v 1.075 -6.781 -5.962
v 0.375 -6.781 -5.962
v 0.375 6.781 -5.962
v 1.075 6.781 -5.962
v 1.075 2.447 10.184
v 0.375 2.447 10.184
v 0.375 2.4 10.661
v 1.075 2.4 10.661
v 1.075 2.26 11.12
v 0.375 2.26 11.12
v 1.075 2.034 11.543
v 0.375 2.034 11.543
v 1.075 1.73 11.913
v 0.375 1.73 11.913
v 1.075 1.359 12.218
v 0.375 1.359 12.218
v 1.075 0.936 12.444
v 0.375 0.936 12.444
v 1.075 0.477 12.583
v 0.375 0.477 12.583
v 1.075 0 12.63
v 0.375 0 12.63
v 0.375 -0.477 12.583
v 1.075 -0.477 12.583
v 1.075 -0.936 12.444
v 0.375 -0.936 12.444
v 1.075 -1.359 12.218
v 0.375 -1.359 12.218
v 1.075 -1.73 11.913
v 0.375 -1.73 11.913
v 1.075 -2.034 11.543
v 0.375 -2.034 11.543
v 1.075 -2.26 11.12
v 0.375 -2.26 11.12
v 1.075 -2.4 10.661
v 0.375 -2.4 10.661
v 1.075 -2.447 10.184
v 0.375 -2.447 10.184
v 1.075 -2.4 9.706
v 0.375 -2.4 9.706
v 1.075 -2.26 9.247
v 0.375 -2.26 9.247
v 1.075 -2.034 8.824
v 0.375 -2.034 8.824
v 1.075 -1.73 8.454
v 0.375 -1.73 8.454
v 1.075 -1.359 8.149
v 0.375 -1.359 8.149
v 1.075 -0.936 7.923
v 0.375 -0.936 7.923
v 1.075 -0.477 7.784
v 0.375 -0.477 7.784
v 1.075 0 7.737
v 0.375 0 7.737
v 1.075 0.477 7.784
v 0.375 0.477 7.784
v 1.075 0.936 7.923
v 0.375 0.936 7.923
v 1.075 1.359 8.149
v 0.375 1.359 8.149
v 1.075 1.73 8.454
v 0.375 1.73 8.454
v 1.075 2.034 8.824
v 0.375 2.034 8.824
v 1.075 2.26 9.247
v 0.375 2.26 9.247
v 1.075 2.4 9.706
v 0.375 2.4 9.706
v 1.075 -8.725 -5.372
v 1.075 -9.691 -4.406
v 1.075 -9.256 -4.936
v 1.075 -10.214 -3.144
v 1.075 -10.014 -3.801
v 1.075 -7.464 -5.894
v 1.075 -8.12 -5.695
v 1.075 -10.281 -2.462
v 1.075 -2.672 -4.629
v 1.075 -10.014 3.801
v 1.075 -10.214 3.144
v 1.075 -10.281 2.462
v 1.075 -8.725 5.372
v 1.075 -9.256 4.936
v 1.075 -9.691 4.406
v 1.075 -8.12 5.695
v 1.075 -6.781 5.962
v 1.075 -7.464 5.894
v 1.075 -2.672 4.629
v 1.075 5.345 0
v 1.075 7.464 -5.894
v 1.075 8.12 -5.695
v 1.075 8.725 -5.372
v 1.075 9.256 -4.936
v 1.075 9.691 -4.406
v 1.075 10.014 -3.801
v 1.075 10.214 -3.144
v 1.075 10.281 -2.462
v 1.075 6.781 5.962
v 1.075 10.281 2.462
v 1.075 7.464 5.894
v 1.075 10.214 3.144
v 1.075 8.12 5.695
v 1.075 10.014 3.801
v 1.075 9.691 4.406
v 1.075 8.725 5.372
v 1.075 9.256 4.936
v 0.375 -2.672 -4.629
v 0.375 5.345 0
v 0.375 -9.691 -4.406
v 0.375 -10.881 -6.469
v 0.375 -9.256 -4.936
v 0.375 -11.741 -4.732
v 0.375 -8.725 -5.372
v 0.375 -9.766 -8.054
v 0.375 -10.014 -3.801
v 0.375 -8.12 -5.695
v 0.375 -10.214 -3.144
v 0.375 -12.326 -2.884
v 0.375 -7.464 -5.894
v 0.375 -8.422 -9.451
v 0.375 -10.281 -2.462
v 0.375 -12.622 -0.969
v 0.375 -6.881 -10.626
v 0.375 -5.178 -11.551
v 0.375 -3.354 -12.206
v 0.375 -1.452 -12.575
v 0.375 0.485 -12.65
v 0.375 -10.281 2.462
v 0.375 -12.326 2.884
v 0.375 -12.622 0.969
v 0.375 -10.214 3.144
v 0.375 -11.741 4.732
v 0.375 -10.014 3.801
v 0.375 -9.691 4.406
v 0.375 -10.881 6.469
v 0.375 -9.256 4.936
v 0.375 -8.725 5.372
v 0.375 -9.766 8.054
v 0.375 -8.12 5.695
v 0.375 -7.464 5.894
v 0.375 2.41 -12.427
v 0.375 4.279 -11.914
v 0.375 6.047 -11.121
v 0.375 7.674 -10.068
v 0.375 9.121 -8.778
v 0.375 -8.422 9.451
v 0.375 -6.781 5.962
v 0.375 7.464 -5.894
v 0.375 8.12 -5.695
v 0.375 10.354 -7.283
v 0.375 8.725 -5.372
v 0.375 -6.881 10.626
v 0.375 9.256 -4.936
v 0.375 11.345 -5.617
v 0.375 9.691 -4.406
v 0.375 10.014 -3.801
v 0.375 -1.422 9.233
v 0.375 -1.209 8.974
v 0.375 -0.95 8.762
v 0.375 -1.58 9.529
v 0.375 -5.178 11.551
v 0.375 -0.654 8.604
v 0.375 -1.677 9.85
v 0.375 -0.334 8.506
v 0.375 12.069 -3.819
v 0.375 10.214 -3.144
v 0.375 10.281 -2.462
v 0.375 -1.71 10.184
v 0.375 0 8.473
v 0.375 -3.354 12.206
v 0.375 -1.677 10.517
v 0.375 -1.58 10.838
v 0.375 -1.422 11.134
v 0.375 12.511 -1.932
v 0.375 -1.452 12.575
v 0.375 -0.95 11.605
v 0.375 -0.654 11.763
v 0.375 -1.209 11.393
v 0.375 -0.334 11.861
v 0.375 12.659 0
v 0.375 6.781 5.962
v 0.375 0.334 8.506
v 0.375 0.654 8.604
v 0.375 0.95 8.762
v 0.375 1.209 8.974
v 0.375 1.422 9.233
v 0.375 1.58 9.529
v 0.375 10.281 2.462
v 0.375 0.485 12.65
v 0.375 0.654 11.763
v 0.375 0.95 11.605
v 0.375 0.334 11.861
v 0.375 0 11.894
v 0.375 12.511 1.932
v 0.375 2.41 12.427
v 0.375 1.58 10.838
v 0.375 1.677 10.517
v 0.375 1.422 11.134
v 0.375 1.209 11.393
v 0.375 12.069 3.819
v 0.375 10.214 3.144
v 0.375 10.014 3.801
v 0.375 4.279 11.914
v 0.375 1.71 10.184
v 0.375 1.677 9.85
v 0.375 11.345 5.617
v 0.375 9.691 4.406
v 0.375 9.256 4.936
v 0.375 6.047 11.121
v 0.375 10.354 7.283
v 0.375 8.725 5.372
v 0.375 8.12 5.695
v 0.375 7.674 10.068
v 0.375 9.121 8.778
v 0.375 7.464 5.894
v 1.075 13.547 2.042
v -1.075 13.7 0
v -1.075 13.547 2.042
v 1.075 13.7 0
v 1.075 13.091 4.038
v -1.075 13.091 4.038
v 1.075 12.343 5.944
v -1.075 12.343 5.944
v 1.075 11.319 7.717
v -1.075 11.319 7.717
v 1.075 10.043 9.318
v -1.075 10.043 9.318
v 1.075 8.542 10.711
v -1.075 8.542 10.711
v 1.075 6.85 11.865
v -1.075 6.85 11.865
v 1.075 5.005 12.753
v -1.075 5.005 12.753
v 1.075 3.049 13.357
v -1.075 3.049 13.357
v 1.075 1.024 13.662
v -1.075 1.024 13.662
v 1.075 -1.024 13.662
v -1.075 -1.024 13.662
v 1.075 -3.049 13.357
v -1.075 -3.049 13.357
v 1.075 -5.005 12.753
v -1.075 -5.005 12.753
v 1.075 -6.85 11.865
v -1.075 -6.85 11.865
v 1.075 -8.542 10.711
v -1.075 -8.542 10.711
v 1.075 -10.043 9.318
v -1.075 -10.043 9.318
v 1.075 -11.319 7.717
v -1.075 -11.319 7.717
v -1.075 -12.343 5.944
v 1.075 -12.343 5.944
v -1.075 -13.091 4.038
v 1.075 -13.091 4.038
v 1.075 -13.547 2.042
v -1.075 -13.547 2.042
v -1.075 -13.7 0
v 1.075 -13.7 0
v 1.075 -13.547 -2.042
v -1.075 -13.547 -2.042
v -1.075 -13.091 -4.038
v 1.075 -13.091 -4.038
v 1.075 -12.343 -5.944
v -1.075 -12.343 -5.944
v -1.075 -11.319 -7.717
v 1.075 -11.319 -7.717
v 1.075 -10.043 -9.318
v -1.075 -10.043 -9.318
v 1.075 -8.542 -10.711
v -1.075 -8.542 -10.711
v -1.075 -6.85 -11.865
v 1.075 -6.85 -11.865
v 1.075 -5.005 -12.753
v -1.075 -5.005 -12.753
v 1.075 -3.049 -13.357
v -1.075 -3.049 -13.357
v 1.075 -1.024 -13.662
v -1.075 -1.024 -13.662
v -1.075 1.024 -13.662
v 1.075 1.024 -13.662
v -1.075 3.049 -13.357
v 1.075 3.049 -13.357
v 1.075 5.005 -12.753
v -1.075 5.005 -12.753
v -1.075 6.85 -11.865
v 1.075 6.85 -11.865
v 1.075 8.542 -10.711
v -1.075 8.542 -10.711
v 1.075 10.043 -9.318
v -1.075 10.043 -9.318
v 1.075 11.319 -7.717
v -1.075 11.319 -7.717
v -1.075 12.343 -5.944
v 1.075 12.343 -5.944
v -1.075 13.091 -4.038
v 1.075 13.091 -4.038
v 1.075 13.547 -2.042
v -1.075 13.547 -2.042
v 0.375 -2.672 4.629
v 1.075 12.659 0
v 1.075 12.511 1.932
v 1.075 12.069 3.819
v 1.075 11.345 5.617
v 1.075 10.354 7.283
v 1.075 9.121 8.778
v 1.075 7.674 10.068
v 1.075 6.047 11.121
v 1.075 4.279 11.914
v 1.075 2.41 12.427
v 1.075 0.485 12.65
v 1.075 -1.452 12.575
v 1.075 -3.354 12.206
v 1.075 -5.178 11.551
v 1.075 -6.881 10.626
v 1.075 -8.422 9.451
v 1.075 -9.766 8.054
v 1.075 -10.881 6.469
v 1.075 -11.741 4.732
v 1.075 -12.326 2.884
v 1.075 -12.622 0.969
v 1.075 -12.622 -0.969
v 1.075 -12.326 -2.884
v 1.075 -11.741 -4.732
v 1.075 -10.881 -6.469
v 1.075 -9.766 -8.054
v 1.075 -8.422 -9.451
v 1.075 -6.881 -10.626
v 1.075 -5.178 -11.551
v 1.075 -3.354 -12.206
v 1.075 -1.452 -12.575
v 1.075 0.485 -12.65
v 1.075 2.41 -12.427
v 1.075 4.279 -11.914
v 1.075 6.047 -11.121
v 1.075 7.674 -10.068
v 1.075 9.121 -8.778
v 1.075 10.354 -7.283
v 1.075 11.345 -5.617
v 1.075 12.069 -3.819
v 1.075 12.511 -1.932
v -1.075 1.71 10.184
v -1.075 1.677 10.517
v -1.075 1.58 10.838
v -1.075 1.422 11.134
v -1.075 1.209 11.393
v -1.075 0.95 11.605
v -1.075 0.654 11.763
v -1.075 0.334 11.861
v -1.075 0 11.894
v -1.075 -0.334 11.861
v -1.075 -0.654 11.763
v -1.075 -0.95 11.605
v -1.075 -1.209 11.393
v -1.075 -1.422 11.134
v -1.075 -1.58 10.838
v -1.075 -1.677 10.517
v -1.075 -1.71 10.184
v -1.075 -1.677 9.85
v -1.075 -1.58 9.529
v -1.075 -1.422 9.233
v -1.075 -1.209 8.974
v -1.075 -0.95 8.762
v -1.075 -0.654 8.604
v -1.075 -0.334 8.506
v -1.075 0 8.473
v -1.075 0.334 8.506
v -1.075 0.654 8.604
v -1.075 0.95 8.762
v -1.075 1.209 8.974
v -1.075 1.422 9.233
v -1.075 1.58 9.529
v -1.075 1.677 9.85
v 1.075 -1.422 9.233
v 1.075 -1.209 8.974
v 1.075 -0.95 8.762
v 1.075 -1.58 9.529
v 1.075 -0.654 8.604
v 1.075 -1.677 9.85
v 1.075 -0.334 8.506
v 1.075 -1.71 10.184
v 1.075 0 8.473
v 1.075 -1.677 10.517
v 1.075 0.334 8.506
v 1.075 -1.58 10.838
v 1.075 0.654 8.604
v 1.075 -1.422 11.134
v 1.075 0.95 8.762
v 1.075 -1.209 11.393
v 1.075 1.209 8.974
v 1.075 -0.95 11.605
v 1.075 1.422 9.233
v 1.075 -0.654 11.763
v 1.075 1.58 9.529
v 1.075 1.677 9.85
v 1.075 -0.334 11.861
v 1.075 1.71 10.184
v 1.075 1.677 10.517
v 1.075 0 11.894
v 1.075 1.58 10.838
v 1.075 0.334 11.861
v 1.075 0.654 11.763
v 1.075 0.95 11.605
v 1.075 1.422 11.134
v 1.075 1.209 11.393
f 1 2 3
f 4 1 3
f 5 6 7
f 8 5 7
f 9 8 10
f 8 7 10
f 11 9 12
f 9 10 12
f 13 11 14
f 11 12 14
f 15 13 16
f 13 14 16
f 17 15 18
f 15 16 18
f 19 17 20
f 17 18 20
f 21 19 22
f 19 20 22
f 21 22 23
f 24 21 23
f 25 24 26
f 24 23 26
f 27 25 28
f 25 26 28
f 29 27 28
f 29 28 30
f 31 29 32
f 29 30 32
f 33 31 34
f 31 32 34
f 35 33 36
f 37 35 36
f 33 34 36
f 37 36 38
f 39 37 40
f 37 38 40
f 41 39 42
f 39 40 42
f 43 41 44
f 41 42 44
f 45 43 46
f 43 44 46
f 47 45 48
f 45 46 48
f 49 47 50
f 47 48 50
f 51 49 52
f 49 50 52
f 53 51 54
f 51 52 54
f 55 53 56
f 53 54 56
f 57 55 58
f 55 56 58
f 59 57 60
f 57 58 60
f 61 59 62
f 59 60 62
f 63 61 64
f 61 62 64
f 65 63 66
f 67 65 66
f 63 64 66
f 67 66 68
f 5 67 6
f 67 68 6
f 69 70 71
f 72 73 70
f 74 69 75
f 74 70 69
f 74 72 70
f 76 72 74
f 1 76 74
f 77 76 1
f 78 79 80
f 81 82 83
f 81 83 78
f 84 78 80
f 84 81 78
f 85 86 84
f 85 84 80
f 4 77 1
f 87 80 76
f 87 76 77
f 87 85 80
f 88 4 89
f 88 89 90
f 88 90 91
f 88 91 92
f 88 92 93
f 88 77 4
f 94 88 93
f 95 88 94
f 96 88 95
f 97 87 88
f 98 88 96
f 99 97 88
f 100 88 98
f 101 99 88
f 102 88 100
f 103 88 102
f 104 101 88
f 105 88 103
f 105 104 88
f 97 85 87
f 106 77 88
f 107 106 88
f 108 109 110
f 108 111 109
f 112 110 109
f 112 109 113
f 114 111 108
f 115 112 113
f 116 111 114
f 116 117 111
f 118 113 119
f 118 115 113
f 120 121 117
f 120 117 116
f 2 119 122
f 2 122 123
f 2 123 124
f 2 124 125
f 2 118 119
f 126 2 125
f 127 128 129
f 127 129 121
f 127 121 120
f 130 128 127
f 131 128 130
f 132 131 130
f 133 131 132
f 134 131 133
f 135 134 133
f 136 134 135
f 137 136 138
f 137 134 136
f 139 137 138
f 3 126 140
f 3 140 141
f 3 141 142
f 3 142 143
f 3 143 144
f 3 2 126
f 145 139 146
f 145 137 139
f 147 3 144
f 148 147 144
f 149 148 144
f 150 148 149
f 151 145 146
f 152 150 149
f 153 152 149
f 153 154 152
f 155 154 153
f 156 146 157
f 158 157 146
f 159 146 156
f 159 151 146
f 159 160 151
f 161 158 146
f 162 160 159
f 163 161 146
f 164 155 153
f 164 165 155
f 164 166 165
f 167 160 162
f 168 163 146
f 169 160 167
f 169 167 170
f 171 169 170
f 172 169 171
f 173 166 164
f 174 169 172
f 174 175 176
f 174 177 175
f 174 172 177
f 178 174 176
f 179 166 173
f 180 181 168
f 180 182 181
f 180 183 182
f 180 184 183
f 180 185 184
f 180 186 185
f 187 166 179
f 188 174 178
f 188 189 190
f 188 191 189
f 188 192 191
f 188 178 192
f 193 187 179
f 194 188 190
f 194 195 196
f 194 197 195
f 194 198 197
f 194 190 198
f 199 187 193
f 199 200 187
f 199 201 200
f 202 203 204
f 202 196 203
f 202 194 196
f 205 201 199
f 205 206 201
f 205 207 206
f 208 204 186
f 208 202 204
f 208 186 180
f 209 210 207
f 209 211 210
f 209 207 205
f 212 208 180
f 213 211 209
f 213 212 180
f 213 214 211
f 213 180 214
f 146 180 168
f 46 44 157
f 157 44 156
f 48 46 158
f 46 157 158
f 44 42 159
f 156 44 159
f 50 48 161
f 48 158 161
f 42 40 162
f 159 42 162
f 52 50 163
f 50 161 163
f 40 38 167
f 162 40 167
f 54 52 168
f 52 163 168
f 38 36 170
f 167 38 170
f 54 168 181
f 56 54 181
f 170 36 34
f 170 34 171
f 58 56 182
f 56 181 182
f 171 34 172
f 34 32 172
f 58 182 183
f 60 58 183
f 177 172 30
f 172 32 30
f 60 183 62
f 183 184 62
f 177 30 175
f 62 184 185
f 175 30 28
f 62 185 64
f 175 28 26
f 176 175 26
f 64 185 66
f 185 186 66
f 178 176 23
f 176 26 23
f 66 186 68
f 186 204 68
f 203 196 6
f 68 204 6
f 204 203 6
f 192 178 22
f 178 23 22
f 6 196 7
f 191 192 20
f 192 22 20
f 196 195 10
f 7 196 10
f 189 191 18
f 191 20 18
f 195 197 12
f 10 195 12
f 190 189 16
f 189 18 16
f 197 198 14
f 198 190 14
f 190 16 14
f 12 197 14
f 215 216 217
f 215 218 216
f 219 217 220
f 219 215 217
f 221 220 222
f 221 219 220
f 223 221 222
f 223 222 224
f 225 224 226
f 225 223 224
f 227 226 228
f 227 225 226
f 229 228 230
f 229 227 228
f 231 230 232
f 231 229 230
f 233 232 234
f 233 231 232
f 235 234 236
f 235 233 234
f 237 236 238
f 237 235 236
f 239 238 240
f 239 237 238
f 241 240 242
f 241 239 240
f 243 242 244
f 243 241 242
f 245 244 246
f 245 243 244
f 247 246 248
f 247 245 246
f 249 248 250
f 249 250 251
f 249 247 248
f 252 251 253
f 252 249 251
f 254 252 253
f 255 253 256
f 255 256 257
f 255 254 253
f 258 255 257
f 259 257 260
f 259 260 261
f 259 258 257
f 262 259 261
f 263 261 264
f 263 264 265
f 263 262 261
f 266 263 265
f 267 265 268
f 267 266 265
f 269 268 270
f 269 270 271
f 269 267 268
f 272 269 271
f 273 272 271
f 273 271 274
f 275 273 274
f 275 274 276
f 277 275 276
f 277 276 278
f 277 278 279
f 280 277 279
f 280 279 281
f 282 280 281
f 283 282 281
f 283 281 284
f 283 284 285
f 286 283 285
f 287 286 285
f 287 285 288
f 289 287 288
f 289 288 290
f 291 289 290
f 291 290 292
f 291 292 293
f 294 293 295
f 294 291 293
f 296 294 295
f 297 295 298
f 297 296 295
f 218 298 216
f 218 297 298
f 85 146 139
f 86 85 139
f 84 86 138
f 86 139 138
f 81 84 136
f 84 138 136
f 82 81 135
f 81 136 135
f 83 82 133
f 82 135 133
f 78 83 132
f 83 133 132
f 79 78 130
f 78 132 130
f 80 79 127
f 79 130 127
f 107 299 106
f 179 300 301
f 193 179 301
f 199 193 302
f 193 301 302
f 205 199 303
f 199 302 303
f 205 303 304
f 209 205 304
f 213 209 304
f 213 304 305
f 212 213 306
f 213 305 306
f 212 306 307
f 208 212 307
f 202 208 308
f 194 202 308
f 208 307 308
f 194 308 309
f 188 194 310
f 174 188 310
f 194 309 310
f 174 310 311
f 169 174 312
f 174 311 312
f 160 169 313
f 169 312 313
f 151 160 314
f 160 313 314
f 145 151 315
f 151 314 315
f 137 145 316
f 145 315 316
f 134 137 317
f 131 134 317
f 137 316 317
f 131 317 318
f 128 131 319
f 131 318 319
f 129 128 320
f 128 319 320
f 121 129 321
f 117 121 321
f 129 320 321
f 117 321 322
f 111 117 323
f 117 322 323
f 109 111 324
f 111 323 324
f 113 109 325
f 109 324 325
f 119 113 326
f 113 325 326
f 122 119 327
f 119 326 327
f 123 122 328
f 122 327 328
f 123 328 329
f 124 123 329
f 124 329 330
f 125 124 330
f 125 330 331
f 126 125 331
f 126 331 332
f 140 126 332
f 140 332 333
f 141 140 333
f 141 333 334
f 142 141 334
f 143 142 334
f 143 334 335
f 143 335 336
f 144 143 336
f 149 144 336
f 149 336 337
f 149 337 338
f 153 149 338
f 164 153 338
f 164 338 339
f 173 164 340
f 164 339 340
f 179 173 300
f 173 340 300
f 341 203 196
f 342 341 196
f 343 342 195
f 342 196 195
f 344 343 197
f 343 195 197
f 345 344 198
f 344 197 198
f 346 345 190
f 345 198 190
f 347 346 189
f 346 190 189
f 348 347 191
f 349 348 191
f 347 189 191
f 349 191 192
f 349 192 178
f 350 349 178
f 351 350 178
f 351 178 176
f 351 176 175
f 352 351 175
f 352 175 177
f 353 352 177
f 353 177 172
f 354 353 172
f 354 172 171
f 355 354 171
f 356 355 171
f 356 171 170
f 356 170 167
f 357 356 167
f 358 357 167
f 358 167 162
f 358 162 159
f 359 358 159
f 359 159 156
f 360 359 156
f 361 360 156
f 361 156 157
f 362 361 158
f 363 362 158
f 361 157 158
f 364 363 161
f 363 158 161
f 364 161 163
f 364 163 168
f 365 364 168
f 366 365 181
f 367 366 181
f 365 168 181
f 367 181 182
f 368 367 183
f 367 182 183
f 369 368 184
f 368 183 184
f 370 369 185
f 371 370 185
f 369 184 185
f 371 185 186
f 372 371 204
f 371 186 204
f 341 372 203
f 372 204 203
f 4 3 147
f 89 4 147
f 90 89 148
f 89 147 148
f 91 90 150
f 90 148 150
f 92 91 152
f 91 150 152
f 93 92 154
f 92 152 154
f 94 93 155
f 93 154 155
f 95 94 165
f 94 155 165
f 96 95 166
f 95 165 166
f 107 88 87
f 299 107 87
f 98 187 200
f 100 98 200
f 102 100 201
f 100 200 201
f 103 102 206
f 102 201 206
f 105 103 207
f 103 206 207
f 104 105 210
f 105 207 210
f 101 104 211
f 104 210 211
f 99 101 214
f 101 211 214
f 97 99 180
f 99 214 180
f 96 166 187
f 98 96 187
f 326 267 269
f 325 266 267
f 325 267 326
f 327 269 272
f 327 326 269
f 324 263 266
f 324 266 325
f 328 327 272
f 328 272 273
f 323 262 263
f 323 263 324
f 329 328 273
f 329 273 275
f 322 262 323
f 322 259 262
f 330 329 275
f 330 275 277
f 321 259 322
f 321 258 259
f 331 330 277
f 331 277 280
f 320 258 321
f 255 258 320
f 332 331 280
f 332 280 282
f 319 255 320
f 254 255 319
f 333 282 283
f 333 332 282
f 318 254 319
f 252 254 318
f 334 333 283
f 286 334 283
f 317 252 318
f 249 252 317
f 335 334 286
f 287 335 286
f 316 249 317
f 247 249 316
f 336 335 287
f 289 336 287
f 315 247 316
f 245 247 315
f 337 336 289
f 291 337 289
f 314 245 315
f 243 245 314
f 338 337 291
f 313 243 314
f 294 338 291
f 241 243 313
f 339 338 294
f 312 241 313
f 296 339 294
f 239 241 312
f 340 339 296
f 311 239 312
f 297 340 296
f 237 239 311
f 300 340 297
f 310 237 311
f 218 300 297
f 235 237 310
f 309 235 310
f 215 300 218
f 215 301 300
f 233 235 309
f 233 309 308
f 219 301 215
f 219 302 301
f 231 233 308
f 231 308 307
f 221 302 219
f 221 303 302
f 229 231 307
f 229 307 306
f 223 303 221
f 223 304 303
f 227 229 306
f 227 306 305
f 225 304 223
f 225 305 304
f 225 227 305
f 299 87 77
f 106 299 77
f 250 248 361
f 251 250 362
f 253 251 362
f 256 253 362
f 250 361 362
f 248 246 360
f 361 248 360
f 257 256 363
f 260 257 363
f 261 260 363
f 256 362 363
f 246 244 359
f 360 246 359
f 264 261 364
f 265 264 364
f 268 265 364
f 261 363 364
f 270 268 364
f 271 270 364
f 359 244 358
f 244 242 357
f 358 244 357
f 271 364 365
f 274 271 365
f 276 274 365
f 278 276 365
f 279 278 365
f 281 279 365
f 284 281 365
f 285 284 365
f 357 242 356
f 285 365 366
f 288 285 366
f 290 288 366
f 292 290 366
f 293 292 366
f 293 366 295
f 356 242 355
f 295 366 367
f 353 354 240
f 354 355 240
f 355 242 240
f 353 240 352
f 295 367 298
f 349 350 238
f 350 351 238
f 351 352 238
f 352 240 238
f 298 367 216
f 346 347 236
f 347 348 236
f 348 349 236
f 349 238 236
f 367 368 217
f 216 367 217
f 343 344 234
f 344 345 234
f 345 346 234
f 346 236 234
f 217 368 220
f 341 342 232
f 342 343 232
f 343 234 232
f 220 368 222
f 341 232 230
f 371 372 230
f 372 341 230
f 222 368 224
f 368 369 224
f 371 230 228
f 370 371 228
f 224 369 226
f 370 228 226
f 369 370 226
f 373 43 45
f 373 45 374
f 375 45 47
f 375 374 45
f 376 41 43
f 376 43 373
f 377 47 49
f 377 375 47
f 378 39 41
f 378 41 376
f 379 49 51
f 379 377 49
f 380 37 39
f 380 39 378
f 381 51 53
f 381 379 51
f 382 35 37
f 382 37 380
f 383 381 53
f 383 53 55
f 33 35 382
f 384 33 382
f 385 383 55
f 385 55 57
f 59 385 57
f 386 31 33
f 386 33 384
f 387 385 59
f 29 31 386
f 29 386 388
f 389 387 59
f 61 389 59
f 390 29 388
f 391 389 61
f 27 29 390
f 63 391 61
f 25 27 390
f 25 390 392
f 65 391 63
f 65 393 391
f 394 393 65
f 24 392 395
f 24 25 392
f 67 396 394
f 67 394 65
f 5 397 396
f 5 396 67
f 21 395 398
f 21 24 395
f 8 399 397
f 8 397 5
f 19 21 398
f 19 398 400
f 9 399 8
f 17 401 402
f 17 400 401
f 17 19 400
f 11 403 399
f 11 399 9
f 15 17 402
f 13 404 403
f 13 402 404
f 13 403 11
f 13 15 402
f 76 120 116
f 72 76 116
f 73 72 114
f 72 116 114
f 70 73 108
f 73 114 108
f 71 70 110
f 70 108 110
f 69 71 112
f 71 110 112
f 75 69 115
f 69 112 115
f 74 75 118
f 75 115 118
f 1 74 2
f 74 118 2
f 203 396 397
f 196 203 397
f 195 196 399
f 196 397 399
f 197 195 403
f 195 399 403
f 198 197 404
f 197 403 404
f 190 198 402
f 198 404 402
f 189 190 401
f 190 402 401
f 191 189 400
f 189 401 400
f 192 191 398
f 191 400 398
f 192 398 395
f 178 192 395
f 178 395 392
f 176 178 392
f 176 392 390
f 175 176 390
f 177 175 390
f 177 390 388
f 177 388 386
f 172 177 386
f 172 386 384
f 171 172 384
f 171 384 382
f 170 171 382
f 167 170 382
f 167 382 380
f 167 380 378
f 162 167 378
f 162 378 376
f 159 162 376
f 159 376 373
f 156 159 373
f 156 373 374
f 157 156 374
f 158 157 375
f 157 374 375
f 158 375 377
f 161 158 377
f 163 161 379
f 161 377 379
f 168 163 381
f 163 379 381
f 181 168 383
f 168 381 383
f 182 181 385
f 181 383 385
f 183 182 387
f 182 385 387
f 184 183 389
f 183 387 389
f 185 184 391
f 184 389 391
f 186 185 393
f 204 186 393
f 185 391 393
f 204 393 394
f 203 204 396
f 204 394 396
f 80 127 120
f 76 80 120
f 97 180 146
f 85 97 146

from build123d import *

# Parameters (mm, degrees)
F0_R      = 13.7
F1_DEPTH  = 1.075
F2_R      = 12.658977
F3_DEPTH  = 0.7
F5_R      = 2.446538
F6_DEPTH  = 0.7
F7_R      = 1.710058
F8_DEPTH  = 2.151
F10_DEPTH = 0.7
F12_DEPTH = 0.7


with BuildPart() as f1:
    # F0 (on Right) → F1 (new body, symmetric)
    with BuildSketch(Plane.YZ):
        Circle(F0_R)
    extrude(amount=F1_DEPTH, both=True)

    # F2 (on face) → F3 (cut)
    with BuildSketch(Plane.YZ.offset(1.075)):
        Circle(F2_R)
    extrude(amount=-F3_DEPTH, mode=Mode.SUBTRACT)


with BuildPart() as f6:
    # F5 (on face) → F6 (new body)
    with BuildSketch(Plane.YZ.offset(0.375)):
        with Locations((0, 10.183519)):
            Circle(F5_R)
    extrude(amount=F6_DEPTH)


with BuildPart() as f8_tool:
    # F7 (on face) → F8 (new body, through all)
    with BuildSketch(Plane.YZ.offset(1.075)):
        with Locations((0, 10.183519)):
            Circle(F7_R)
    extrude(amount=-F8_DEPTH)


with BuildPart() as f1_1:
    add(f1.part)

    # F8: cut by f8_tool
    add(f8_tool.part, mode=Mode.SUBTRACT)

    # F9 (on face) → F10 (join)
    with BuildSketch(Plane.YZ.offset(0.375)):
        with BuildLine():
            Line((6.780862, 5.961541), (-6.780862, 5.961541))
            ThreePointArc((-6.780862, 5.961541), (-9.255736, 4.936414), (-10.280862, 2.461541))
            Line((-10.280862, 2.461541), (-10.280862, -2.461541))
            ThreePointArc((-10.280862, -2.461541), (-9.255736, -4.936414), (-6.780862, -5.961541))
            Line((-6.780862, -5.961541), (6.780862, -5.961541))
            ThreePointArc((6.780862, -5.961541), (9.255736, -4.936414), (10.280862, -2.461541))
            Line((10.280862, -2.461541), (10.280862, 2.461541))
            ThreePointArc((10.280862, 2.461541), (9.255736, 4.936414), (6.780862, 5.961541))
        make_face()
    extrude(amount=F10_DEPTH)

    # F11 (on face) → F12 (cut)
    with BuildSketch(Plane.YZ.offset(1.075)):
        Polygon((-2.6725, 4.628907), (-2.6725, -4.628907), (5.345001, 0), align=None)
    extrude(amount=-F12_DEPTH, mode=Mode.SUBTRACT)


with BuildPart() as f6_1:
    add(f6.part)

    # F8: cut by f8_tool
    add(f8_tool.part, mode=Mode.SUBTRACT)


solid = Compound([f1_1.part, f6_1.part])
